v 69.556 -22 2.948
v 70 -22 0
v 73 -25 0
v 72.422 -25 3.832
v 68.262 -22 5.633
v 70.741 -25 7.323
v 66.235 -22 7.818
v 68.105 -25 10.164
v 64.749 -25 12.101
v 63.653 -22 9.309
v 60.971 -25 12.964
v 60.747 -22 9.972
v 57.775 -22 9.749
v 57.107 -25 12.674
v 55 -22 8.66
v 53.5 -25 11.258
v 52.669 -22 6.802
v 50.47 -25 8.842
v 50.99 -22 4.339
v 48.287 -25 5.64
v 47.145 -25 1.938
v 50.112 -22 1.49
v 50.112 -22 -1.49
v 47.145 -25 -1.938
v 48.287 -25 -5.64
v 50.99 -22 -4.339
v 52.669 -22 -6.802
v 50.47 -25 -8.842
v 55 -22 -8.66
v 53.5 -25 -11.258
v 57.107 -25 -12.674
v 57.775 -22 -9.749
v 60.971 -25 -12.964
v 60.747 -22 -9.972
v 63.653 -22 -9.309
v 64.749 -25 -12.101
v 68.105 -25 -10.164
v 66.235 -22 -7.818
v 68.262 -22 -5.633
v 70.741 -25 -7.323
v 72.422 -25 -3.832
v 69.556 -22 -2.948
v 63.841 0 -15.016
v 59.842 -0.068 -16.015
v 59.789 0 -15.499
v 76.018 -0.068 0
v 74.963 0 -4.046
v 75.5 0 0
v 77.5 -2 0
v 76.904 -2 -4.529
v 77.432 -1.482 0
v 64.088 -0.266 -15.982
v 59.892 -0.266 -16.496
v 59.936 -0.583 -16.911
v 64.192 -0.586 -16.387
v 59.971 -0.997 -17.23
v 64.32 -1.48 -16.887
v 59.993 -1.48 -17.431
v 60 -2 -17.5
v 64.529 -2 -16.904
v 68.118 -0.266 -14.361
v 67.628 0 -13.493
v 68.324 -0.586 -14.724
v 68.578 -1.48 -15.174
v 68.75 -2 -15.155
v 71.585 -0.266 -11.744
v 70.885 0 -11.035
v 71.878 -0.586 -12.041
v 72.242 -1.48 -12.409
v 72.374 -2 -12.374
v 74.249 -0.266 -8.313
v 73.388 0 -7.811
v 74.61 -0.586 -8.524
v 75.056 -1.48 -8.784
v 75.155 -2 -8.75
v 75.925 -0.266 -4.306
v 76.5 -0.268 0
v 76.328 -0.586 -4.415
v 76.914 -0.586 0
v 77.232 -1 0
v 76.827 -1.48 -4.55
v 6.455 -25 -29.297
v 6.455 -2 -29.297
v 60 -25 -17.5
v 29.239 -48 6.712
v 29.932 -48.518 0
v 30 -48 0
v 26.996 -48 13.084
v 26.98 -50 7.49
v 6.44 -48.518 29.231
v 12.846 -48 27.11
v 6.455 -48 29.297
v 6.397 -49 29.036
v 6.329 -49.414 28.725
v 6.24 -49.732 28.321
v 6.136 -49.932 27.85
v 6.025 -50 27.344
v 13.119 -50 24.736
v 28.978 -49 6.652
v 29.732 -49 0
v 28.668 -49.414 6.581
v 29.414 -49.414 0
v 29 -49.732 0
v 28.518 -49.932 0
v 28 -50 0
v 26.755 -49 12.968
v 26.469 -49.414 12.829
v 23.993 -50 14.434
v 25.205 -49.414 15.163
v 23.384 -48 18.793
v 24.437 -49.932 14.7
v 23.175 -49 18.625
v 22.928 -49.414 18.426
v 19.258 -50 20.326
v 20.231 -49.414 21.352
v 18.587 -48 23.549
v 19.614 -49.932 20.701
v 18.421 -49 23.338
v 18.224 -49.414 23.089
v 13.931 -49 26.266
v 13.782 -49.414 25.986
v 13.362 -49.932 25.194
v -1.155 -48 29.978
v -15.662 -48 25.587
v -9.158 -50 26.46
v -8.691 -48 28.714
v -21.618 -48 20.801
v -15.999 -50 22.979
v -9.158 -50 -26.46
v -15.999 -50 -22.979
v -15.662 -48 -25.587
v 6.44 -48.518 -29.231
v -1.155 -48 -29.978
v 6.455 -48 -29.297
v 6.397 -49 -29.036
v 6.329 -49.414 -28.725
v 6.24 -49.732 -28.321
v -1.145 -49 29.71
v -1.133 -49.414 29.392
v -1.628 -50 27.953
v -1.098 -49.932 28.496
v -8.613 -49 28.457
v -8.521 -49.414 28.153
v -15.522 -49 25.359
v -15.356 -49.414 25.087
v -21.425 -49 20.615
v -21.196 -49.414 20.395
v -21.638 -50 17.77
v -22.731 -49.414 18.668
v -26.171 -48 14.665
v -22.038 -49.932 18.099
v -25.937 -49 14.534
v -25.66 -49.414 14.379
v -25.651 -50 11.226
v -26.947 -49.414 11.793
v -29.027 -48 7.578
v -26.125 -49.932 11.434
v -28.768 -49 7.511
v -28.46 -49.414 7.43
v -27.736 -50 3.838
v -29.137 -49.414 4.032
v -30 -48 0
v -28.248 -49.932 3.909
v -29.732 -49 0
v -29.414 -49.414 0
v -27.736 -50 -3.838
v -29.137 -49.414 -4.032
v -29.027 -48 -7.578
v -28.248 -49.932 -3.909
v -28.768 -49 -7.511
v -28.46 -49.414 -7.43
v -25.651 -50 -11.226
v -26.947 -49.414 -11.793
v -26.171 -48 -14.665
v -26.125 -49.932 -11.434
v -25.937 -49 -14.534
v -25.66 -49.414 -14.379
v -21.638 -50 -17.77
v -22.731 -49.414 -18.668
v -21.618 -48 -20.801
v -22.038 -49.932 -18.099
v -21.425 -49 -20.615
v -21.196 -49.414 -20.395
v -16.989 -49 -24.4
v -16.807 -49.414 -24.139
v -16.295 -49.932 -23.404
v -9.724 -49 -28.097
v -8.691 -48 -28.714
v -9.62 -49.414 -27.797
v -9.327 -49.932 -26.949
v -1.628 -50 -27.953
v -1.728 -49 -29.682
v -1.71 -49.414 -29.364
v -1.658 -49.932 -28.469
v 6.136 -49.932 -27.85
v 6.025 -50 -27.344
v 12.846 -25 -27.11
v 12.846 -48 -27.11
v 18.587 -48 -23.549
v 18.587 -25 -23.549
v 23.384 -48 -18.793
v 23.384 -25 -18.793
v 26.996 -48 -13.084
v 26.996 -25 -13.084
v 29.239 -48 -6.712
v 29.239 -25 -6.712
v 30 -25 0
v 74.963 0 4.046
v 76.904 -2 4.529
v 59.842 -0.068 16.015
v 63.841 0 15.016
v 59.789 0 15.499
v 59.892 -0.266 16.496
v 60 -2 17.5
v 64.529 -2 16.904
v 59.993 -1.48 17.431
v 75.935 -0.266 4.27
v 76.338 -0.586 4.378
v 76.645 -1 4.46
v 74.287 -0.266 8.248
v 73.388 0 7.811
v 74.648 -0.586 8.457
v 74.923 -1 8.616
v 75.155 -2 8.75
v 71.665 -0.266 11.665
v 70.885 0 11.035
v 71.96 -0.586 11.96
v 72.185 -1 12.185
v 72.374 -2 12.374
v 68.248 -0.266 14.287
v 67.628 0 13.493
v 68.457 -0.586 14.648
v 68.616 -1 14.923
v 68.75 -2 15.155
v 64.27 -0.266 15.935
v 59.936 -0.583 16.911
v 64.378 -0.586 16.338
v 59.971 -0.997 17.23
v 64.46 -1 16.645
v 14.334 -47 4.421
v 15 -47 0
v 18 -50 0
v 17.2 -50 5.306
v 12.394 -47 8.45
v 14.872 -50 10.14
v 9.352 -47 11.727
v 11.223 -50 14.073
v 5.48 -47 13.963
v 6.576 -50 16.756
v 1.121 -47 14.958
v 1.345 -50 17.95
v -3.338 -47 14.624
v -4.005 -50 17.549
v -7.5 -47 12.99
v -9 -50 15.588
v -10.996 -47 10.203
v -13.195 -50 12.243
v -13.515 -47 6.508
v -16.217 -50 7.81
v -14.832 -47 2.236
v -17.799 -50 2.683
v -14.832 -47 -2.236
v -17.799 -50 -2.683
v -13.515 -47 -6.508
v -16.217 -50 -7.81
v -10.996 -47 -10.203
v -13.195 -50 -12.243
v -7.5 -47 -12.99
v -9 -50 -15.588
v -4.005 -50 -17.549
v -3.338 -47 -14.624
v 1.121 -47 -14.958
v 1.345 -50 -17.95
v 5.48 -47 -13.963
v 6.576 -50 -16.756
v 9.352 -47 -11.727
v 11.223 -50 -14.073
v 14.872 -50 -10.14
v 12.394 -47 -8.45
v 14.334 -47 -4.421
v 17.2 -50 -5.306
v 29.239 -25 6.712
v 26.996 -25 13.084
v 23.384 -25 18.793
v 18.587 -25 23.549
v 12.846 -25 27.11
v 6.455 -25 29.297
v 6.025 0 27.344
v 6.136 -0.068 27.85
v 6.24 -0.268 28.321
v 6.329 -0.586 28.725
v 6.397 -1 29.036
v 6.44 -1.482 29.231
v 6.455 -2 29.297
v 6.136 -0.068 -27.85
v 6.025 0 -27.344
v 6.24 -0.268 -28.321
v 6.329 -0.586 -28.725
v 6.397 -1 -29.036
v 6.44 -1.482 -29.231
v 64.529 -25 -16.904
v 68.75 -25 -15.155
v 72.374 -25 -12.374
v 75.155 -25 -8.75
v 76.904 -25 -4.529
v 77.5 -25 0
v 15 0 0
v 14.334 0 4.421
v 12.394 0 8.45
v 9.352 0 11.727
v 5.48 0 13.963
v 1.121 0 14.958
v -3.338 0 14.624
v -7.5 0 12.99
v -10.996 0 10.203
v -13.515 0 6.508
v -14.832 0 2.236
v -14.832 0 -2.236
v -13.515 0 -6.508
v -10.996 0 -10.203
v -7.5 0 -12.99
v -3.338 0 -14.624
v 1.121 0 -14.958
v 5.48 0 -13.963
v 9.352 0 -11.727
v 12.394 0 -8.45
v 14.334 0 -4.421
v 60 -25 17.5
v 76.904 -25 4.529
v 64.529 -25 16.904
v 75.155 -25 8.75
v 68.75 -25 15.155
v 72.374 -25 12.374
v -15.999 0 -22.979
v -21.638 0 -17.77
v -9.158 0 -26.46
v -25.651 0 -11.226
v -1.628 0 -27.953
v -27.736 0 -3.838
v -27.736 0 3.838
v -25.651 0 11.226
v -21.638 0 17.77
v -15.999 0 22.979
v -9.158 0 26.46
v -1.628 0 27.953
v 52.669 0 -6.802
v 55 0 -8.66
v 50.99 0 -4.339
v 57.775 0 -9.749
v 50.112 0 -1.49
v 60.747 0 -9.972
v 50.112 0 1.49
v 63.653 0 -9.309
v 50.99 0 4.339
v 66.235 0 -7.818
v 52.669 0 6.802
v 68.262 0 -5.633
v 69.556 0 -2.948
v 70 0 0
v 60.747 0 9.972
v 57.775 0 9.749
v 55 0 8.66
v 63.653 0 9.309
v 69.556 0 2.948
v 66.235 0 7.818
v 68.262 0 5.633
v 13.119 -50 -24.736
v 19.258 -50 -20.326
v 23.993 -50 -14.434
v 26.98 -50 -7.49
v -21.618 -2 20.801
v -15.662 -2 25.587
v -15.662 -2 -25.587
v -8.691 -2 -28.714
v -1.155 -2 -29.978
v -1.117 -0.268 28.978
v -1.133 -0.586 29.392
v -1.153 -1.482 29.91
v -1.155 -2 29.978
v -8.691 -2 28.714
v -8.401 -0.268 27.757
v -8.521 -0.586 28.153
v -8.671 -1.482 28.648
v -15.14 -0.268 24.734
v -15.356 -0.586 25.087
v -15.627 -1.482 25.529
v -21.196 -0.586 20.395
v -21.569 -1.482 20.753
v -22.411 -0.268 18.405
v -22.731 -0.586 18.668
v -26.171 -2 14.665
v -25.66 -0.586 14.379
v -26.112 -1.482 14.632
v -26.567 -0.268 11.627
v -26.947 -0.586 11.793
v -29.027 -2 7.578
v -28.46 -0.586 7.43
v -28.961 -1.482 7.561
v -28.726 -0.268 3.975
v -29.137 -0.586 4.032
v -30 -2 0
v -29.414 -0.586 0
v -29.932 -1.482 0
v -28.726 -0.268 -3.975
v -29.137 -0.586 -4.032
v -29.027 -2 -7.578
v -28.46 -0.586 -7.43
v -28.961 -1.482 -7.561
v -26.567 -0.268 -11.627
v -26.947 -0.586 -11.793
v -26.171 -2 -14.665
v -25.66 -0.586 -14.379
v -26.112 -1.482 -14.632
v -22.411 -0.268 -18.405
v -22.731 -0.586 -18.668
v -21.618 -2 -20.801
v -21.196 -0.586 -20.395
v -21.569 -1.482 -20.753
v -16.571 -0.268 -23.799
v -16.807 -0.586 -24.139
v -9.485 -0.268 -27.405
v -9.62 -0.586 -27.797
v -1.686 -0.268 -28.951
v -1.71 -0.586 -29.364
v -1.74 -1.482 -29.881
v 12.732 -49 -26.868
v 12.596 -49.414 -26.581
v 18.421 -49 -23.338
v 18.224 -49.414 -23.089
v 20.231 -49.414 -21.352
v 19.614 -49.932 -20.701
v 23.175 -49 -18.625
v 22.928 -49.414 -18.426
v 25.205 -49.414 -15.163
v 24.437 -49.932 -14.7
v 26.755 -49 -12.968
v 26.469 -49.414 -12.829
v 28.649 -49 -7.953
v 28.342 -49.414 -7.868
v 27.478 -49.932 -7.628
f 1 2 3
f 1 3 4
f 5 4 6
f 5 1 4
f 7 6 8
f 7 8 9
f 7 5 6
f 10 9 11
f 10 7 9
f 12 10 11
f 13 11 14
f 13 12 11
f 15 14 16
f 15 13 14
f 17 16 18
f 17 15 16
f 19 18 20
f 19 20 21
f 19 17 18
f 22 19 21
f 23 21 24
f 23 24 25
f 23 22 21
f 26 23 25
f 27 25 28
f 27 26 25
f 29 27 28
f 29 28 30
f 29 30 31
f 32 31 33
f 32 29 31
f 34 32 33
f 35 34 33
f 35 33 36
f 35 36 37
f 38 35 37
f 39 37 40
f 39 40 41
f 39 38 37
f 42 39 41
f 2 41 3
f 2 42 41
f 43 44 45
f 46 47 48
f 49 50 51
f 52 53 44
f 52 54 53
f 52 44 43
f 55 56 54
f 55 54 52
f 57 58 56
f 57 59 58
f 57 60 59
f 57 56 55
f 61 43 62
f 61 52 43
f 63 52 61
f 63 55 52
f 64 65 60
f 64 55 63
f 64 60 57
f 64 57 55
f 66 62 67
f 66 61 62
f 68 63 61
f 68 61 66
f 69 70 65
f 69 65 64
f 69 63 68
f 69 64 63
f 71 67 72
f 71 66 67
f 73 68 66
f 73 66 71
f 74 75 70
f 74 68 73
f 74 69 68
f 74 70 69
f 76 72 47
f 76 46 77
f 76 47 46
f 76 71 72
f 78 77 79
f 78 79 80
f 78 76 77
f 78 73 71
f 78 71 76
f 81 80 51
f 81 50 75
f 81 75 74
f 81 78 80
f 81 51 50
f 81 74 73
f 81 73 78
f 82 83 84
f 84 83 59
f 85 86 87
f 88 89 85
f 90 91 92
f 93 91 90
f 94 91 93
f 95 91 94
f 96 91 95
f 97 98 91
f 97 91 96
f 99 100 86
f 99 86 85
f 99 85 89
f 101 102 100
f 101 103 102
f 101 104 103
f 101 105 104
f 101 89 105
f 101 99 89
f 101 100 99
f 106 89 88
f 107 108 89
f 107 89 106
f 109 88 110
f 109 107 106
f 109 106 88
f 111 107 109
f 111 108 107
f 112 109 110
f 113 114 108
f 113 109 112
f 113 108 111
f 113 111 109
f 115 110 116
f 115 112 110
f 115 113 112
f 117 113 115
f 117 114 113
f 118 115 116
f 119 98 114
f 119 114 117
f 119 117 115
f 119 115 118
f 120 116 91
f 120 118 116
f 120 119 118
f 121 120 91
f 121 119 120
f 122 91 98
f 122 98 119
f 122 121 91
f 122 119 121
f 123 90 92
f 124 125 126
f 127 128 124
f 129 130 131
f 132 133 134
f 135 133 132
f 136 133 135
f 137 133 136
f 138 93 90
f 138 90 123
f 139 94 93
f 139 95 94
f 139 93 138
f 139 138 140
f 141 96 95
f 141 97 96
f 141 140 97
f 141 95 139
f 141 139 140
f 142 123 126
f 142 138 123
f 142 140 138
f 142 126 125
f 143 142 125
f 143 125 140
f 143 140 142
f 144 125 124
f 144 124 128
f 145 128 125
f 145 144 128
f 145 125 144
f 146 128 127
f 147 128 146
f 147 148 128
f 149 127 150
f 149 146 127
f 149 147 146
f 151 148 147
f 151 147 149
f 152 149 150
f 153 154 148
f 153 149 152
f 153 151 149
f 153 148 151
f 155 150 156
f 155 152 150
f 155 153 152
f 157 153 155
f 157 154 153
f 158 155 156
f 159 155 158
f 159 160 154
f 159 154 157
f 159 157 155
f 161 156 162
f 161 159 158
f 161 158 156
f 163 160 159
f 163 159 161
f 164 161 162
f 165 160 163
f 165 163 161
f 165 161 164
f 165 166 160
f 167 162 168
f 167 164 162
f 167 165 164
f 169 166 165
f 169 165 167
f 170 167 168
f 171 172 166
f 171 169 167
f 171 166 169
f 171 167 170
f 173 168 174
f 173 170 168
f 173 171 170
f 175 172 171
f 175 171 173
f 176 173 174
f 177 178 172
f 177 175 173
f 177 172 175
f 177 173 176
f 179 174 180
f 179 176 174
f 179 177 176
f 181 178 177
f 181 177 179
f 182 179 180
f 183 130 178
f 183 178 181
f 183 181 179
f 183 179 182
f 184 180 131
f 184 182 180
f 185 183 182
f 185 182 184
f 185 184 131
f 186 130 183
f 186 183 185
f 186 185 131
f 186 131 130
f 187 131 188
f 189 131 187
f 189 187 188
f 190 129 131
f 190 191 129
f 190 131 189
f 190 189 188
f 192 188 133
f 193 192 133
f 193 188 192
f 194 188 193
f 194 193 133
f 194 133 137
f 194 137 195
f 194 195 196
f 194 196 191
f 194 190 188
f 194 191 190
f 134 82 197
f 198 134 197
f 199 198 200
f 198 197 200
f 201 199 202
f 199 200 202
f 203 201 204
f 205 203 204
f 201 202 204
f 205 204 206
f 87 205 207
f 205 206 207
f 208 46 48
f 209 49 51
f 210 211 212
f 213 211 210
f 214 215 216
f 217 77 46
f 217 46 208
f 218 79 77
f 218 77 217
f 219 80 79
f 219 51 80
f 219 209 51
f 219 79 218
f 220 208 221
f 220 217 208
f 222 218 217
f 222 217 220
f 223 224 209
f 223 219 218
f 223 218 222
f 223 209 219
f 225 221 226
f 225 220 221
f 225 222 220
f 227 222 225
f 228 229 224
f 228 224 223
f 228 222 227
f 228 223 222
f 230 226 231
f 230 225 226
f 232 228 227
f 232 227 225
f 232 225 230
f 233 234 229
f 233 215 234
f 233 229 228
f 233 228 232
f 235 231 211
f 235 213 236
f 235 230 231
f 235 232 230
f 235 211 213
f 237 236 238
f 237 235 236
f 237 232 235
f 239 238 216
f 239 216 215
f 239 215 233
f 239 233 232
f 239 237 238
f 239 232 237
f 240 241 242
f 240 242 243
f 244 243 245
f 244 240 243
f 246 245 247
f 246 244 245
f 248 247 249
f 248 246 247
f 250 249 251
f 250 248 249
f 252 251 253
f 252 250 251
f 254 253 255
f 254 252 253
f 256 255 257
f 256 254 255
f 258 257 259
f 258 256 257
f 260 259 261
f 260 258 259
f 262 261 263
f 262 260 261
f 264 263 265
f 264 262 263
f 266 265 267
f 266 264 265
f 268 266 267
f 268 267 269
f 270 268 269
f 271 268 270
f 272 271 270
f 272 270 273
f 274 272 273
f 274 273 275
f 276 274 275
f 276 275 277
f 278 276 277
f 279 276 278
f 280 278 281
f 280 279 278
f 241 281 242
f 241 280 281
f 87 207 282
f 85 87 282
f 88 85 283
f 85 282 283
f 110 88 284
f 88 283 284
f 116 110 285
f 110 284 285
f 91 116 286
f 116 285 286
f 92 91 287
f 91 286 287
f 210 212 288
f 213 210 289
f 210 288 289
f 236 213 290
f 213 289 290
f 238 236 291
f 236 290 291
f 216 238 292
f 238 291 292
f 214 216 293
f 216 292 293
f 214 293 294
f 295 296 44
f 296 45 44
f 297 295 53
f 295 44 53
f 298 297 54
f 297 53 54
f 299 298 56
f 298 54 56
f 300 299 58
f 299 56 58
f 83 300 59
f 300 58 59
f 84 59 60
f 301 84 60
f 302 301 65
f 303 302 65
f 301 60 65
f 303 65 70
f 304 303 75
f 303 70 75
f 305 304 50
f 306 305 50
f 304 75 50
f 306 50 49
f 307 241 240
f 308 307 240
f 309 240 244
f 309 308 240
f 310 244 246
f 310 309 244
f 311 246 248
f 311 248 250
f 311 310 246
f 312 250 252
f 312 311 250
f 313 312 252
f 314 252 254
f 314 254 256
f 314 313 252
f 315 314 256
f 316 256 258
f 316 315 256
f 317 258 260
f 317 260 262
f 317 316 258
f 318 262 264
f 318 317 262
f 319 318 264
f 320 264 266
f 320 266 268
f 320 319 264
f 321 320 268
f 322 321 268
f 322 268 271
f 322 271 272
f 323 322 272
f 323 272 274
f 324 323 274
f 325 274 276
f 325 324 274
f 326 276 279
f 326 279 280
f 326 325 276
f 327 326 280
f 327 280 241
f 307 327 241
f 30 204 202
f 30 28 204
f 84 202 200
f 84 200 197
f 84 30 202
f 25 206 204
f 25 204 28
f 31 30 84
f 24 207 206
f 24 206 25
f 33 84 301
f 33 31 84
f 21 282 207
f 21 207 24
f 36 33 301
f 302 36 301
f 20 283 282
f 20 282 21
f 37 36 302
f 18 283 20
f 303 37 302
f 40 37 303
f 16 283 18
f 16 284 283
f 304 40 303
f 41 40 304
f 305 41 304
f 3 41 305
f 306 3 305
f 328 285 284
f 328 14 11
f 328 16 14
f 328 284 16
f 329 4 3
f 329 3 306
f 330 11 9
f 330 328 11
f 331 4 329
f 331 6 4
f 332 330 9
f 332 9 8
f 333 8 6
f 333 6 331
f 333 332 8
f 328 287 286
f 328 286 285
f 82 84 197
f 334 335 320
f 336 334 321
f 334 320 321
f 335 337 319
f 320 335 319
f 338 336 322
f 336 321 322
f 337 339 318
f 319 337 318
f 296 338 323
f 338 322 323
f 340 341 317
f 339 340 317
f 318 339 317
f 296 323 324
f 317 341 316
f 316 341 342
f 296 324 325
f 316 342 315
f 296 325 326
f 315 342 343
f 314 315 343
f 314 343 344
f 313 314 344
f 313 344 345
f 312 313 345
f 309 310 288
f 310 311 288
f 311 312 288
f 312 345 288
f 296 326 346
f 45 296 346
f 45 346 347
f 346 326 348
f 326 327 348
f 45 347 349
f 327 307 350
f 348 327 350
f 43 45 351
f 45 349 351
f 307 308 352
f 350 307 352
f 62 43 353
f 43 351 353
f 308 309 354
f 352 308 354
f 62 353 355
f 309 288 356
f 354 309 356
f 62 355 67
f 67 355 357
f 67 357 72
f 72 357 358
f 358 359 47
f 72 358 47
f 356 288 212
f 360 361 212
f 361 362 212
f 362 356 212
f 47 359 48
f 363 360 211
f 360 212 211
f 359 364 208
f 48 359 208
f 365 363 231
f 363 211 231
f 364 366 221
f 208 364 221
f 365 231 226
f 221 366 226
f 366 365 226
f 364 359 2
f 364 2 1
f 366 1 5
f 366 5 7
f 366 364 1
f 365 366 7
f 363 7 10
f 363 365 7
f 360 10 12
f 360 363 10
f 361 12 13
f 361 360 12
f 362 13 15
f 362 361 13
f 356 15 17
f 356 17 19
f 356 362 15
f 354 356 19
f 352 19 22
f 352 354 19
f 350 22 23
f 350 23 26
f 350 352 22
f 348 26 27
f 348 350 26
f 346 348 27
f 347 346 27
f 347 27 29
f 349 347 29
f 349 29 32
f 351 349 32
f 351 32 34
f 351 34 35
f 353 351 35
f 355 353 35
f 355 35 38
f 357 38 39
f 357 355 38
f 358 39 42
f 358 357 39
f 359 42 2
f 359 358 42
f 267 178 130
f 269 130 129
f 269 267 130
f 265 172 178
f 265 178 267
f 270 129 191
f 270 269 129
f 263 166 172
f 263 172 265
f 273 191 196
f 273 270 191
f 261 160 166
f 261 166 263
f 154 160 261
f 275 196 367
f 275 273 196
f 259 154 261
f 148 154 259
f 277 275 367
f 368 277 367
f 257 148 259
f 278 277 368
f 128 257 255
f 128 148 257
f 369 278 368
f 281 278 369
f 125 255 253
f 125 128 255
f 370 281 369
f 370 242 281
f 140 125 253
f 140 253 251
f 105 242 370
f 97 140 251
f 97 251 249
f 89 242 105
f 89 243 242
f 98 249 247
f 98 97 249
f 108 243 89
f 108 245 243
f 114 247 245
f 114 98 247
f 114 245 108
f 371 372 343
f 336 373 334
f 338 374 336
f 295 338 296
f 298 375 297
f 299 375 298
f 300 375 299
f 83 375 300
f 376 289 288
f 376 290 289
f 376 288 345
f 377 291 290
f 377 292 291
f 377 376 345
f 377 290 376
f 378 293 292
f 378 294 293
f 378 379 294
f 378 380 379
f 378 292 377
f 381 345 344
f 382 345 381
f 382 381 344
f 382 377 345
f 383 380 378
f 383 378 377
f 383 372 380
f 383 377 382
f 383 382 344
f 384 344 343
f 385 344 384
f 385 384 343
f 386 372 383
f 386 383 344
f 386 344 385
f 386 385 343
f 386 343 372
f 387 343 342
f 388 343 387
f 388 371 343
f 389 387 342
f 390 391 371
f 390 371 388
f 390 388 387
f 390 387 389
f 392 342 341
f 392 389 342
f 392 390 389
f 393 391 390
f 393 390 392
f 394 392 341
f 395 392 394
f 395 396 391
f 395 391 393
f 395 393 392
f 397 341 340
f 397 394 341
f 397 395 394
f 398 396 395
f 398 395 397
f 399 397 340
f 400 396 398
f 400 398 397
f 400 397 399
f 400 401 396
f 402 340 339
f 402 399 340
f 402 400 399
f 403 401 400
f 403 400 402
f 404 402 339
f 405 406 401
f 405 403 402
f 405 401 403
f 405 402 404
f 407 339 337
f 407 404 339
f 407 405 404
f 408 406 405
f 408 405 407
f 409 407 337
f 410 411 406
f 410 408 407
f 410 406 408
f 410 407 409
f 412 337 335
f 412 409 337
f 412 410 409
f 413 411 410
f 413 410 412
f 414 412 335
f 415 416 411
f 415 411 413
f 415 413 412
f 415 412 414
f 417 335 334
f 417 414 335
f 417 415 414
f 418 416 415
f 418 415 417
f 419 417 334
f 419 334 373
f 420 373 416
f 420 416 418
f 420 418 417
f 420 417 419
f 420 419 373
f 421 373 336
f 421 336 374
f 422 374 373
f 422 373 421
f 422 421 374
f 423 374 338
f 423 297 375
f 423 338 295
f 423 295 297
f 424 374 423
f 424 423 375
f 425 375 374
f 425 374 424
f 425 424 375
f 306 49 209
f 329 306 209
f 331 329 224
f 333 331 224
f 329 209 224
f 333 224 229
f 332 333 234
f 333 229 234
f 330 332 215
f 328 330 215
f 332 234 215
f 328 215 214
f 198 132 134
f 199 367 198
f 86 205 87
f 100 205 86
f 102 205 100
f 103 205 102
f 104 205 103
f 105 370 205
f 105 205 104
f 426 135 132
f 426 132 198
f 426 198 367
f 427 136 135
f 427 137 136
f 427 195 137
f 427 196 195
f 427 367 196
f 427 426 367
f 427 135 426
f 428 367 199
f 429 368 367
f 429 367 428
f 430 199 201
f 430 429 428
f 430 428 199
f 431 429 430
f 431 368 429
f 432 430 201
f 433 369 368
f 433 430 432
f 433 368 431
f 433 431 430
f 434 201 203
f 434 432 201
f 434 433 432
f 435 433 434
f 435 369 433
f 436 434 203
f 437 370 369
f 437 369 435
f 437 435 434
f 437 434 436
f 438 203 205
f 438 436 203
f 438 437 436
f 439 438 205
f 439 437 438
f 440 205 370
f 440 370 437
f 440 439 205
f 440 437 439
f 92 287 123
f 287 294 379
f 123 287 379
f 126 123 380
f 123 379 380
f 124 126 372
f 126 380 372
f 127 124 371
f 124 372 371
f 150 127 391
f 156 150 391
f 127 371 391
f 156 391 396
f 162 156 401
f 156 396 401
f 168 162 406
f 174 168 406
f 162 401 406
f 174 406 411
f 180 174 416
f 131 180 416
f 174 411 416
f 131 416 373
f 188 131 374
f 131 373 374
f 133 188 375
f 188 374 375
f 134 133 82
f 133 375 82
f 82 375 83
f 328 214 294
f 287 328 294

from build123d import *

# Parameters (mm, degrees)
F0_R     = 15
F0_R_2   = 10
F1_DEPTH = 25
F2_DEPTH = 50
F3_R     = 2
F4_SIZE  = 3


with BuildPart() as f1:
    # F0 (on Front) → F1 (new body)
    with BuildSketch(Plane.XZ):
        with BuildLine():
            ThreePointArc((6.454945, -29.297332), (23.384272, -18.792973), (30, 0))
            ThreePointArc((30, 0), (23.384272, 18.792973), (6.454945, 29.297332))
            ThreePointArc((6.454945, 29.297332), (-30, 0), (6.454945, -29.297332))
        make_face()
        Circle(F0_R, mode=Mode.SUBTRACT)
        with BuildLine():
            ThreePointArc((6.454945, 29.297332), (23.384272, 18.792973), (30, 0))
            ThreePointArc((30, 0), (23.384272, -18.792973), (6.454945, -29.297332))
            Line((6.454945, -29.297332), (60, -17.5))
            ThreePointArc((60, -17.5), (42.5, 0), (60, 17.5))
            Line((60, 17.5), (6.454945, 29.297332))
        make_face()
        with BuildLine():
            ThreePointArc((77.5, 0), (72.374369, 12.374369), (60, 17.5))
            ThreePointArc((60, 17.5), (42.5, 0), (60, -17.5))
            ThreePointArc((60, -17.5), (72.374369, -12.374369), (77.5, 0))
        make_face()
        with Locations((60, 0)):
            Circle(F0_R_2, mode=Mode.SUBTRACT)
    extrude(amount=F1_DEPTH)

    # F0 (on Front) → F2 (join)
    with BuildSketch(Plane.XZ):
        with BuildLine():
            ThreePointArc((6.454945, -29.297332), (23.384272, -18.792973), (30, 0))
            ThreePointArc((30, 0), (23.384272, 18.792973), (6.454945, 29.297332))
            ThreePointArc((6.454945, 29.297332), (-30, 0), (6.454945, -29.297332))
        make_face()
        Circle(F0_R, mode=Mode.SUBTRACT)
    extrude(amount=F2_DEPTH)

    # F3
    f3_edges = [f1.edges().sort_by_distance(p)[0] for p in [
        (33.227472, 0, -23.398666),
        (-6.454945, -50, 29.297332),
        (77.5, 0, 0),
        (-30, 0, 0),
        (33.227472, 0, 23.398666),
    ]]
    fillet(f3_edges, radius=F3_R)

    # F4
    f4_edges = [f1.edges().sort_by_distance(p)[0] for p in [
        (-15, -50, 0),
        (50, -25, 0),
    ]]
    chamfer(f4_edges, length=F4_SIZE)


solid = f1.part
